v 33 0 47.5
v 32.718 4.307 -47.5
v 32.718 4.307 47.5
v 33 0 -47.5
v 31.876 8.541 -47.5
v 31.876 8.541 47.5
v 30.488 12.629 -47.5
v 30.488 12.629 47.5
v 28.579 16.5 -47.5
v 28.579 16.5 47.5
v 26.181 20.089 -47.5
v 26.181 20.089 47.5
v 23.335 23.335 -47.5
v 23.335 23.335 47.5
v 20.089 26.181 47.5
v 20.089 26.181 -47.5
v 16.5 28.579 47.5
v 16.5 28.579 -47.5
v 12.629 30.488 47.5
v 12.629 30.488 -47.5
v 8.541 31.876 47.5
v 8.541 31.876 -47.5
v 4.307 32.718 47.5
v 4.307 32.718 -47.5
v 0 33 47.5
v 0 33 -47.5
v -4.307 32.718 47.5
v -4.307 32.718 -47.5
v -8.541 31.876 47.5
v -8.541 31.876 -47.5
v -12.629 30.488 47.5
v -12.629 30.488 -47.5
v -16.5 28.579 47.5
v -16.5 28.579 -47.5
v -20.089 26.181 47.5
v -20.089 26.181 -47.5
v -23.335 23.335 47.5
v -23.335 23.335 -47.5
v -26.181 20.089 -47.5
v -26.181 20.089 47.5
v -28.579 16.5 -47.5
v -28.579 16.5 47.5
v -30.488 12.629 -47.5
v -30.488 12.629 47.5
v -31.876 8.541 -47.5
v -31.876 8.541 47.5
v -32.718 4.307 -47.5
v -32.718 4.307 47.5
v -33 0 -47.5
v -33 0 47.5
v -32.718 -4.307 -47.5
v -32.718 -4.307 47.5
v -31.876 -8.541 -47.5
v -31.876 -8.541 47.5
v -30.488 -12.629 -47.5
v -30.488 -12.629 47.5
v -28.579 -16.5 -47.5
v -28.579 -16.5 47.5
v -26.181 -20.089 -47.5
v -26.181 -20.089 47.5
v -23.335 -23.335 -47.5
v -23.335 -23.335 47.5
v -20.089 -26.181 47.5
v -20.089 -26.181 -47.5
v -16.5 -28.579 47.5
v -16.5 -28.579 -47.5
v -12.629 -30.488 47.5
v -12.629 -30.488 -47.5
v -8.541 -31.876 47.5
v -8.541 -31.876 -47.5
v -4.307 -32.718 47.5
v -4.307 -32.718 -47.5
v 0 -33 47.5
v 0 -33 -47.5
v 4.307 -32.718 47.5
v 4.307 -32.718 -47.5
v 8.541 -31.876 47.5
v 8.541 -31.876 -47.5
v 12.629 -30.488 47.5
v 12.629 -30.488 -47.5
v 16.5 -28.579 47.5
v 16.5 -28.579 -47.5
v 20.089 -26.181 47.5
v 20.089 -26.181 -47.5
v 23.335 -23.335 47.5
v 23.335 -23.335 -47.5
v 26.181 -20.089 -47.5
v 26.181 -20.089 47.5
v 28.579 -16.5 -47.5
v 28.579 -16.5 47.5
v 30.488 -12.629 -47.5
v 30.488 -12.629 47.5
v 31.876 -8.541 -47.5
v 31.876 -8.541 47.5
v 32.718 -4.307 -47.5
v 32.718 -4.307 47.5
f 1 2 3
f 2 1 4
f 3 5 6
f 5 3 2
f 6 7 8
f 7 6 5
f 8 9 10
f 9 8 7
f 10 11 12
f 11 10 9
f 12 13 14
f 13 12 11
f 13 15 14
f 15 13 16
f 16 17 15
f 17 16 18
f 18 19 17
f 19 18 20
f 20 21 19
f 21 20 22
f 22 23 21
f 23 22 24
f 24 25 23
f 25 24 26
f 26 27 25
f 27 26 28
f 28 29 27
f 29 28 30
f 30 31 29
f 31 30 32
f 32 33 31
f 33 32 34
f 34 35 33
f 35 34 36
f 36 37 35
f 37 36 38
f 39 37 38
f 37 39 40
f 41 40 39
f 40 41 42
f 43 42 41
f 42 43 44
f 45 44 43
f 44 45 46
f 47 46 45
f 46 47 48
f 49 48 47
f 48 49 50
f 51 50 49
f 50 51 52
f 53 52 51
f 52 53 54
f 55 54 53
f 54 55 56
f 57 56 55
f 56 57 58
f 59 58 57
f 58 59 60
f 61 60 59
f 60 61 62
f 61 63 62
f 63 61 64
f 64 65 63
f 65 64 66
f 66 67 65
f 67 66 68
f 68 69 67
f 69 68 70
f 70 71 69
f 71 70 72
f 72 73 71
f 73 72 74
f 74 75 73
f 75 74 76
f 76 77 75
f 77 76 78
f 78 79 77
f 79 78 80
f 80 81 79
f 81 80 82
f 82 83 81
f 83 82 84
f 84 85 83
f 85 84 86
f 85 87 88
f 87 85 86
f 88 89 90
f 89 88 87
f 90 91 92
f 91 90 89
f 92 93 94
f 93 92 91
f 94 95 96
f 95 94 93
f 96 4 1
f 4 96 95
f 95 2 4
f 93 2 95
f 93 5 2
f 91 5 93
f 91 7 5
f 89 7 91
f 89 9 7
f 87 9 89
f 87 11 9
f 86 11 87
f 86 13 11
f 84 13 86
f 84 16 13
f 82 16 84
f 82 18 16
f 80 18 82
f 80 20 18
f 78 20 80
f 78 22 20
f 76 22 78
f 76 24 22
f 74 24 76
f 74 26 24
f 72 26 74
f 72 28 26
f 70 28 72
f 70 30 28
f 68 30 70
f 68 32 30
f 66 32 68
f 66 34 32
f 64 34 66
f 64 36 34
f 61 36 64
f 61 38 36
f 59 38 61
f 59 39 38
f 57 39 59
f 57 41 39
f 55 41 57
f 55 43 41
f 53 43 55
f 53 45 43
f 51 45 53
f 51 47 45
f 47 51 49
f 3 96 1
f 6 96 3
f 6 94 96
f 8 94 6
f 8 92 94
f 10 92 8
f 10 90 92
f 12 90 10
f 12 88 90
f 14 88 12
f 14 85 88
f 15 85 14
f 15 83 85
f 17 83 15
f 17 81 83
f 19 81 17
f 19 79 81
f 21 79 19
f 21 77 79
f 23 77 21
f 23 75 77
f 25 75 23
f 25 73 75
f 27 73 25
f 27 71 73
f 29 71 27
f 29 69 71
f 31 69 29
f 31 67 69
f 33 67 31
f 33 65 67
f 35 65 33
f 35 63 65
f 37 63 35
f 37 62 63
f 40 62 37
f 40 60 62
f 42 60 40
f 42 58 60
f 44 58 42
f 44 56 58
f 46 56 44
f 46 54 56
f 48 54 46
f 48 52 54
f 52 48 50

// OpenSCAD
// ========================================
// a cylinder with radius 33 mm and height 95 mm
// NeuroCAD canonical IR; dimensions are millimetres
// ========================================
$fn = 48;

cylinder(r=33, h=95, center=true);
